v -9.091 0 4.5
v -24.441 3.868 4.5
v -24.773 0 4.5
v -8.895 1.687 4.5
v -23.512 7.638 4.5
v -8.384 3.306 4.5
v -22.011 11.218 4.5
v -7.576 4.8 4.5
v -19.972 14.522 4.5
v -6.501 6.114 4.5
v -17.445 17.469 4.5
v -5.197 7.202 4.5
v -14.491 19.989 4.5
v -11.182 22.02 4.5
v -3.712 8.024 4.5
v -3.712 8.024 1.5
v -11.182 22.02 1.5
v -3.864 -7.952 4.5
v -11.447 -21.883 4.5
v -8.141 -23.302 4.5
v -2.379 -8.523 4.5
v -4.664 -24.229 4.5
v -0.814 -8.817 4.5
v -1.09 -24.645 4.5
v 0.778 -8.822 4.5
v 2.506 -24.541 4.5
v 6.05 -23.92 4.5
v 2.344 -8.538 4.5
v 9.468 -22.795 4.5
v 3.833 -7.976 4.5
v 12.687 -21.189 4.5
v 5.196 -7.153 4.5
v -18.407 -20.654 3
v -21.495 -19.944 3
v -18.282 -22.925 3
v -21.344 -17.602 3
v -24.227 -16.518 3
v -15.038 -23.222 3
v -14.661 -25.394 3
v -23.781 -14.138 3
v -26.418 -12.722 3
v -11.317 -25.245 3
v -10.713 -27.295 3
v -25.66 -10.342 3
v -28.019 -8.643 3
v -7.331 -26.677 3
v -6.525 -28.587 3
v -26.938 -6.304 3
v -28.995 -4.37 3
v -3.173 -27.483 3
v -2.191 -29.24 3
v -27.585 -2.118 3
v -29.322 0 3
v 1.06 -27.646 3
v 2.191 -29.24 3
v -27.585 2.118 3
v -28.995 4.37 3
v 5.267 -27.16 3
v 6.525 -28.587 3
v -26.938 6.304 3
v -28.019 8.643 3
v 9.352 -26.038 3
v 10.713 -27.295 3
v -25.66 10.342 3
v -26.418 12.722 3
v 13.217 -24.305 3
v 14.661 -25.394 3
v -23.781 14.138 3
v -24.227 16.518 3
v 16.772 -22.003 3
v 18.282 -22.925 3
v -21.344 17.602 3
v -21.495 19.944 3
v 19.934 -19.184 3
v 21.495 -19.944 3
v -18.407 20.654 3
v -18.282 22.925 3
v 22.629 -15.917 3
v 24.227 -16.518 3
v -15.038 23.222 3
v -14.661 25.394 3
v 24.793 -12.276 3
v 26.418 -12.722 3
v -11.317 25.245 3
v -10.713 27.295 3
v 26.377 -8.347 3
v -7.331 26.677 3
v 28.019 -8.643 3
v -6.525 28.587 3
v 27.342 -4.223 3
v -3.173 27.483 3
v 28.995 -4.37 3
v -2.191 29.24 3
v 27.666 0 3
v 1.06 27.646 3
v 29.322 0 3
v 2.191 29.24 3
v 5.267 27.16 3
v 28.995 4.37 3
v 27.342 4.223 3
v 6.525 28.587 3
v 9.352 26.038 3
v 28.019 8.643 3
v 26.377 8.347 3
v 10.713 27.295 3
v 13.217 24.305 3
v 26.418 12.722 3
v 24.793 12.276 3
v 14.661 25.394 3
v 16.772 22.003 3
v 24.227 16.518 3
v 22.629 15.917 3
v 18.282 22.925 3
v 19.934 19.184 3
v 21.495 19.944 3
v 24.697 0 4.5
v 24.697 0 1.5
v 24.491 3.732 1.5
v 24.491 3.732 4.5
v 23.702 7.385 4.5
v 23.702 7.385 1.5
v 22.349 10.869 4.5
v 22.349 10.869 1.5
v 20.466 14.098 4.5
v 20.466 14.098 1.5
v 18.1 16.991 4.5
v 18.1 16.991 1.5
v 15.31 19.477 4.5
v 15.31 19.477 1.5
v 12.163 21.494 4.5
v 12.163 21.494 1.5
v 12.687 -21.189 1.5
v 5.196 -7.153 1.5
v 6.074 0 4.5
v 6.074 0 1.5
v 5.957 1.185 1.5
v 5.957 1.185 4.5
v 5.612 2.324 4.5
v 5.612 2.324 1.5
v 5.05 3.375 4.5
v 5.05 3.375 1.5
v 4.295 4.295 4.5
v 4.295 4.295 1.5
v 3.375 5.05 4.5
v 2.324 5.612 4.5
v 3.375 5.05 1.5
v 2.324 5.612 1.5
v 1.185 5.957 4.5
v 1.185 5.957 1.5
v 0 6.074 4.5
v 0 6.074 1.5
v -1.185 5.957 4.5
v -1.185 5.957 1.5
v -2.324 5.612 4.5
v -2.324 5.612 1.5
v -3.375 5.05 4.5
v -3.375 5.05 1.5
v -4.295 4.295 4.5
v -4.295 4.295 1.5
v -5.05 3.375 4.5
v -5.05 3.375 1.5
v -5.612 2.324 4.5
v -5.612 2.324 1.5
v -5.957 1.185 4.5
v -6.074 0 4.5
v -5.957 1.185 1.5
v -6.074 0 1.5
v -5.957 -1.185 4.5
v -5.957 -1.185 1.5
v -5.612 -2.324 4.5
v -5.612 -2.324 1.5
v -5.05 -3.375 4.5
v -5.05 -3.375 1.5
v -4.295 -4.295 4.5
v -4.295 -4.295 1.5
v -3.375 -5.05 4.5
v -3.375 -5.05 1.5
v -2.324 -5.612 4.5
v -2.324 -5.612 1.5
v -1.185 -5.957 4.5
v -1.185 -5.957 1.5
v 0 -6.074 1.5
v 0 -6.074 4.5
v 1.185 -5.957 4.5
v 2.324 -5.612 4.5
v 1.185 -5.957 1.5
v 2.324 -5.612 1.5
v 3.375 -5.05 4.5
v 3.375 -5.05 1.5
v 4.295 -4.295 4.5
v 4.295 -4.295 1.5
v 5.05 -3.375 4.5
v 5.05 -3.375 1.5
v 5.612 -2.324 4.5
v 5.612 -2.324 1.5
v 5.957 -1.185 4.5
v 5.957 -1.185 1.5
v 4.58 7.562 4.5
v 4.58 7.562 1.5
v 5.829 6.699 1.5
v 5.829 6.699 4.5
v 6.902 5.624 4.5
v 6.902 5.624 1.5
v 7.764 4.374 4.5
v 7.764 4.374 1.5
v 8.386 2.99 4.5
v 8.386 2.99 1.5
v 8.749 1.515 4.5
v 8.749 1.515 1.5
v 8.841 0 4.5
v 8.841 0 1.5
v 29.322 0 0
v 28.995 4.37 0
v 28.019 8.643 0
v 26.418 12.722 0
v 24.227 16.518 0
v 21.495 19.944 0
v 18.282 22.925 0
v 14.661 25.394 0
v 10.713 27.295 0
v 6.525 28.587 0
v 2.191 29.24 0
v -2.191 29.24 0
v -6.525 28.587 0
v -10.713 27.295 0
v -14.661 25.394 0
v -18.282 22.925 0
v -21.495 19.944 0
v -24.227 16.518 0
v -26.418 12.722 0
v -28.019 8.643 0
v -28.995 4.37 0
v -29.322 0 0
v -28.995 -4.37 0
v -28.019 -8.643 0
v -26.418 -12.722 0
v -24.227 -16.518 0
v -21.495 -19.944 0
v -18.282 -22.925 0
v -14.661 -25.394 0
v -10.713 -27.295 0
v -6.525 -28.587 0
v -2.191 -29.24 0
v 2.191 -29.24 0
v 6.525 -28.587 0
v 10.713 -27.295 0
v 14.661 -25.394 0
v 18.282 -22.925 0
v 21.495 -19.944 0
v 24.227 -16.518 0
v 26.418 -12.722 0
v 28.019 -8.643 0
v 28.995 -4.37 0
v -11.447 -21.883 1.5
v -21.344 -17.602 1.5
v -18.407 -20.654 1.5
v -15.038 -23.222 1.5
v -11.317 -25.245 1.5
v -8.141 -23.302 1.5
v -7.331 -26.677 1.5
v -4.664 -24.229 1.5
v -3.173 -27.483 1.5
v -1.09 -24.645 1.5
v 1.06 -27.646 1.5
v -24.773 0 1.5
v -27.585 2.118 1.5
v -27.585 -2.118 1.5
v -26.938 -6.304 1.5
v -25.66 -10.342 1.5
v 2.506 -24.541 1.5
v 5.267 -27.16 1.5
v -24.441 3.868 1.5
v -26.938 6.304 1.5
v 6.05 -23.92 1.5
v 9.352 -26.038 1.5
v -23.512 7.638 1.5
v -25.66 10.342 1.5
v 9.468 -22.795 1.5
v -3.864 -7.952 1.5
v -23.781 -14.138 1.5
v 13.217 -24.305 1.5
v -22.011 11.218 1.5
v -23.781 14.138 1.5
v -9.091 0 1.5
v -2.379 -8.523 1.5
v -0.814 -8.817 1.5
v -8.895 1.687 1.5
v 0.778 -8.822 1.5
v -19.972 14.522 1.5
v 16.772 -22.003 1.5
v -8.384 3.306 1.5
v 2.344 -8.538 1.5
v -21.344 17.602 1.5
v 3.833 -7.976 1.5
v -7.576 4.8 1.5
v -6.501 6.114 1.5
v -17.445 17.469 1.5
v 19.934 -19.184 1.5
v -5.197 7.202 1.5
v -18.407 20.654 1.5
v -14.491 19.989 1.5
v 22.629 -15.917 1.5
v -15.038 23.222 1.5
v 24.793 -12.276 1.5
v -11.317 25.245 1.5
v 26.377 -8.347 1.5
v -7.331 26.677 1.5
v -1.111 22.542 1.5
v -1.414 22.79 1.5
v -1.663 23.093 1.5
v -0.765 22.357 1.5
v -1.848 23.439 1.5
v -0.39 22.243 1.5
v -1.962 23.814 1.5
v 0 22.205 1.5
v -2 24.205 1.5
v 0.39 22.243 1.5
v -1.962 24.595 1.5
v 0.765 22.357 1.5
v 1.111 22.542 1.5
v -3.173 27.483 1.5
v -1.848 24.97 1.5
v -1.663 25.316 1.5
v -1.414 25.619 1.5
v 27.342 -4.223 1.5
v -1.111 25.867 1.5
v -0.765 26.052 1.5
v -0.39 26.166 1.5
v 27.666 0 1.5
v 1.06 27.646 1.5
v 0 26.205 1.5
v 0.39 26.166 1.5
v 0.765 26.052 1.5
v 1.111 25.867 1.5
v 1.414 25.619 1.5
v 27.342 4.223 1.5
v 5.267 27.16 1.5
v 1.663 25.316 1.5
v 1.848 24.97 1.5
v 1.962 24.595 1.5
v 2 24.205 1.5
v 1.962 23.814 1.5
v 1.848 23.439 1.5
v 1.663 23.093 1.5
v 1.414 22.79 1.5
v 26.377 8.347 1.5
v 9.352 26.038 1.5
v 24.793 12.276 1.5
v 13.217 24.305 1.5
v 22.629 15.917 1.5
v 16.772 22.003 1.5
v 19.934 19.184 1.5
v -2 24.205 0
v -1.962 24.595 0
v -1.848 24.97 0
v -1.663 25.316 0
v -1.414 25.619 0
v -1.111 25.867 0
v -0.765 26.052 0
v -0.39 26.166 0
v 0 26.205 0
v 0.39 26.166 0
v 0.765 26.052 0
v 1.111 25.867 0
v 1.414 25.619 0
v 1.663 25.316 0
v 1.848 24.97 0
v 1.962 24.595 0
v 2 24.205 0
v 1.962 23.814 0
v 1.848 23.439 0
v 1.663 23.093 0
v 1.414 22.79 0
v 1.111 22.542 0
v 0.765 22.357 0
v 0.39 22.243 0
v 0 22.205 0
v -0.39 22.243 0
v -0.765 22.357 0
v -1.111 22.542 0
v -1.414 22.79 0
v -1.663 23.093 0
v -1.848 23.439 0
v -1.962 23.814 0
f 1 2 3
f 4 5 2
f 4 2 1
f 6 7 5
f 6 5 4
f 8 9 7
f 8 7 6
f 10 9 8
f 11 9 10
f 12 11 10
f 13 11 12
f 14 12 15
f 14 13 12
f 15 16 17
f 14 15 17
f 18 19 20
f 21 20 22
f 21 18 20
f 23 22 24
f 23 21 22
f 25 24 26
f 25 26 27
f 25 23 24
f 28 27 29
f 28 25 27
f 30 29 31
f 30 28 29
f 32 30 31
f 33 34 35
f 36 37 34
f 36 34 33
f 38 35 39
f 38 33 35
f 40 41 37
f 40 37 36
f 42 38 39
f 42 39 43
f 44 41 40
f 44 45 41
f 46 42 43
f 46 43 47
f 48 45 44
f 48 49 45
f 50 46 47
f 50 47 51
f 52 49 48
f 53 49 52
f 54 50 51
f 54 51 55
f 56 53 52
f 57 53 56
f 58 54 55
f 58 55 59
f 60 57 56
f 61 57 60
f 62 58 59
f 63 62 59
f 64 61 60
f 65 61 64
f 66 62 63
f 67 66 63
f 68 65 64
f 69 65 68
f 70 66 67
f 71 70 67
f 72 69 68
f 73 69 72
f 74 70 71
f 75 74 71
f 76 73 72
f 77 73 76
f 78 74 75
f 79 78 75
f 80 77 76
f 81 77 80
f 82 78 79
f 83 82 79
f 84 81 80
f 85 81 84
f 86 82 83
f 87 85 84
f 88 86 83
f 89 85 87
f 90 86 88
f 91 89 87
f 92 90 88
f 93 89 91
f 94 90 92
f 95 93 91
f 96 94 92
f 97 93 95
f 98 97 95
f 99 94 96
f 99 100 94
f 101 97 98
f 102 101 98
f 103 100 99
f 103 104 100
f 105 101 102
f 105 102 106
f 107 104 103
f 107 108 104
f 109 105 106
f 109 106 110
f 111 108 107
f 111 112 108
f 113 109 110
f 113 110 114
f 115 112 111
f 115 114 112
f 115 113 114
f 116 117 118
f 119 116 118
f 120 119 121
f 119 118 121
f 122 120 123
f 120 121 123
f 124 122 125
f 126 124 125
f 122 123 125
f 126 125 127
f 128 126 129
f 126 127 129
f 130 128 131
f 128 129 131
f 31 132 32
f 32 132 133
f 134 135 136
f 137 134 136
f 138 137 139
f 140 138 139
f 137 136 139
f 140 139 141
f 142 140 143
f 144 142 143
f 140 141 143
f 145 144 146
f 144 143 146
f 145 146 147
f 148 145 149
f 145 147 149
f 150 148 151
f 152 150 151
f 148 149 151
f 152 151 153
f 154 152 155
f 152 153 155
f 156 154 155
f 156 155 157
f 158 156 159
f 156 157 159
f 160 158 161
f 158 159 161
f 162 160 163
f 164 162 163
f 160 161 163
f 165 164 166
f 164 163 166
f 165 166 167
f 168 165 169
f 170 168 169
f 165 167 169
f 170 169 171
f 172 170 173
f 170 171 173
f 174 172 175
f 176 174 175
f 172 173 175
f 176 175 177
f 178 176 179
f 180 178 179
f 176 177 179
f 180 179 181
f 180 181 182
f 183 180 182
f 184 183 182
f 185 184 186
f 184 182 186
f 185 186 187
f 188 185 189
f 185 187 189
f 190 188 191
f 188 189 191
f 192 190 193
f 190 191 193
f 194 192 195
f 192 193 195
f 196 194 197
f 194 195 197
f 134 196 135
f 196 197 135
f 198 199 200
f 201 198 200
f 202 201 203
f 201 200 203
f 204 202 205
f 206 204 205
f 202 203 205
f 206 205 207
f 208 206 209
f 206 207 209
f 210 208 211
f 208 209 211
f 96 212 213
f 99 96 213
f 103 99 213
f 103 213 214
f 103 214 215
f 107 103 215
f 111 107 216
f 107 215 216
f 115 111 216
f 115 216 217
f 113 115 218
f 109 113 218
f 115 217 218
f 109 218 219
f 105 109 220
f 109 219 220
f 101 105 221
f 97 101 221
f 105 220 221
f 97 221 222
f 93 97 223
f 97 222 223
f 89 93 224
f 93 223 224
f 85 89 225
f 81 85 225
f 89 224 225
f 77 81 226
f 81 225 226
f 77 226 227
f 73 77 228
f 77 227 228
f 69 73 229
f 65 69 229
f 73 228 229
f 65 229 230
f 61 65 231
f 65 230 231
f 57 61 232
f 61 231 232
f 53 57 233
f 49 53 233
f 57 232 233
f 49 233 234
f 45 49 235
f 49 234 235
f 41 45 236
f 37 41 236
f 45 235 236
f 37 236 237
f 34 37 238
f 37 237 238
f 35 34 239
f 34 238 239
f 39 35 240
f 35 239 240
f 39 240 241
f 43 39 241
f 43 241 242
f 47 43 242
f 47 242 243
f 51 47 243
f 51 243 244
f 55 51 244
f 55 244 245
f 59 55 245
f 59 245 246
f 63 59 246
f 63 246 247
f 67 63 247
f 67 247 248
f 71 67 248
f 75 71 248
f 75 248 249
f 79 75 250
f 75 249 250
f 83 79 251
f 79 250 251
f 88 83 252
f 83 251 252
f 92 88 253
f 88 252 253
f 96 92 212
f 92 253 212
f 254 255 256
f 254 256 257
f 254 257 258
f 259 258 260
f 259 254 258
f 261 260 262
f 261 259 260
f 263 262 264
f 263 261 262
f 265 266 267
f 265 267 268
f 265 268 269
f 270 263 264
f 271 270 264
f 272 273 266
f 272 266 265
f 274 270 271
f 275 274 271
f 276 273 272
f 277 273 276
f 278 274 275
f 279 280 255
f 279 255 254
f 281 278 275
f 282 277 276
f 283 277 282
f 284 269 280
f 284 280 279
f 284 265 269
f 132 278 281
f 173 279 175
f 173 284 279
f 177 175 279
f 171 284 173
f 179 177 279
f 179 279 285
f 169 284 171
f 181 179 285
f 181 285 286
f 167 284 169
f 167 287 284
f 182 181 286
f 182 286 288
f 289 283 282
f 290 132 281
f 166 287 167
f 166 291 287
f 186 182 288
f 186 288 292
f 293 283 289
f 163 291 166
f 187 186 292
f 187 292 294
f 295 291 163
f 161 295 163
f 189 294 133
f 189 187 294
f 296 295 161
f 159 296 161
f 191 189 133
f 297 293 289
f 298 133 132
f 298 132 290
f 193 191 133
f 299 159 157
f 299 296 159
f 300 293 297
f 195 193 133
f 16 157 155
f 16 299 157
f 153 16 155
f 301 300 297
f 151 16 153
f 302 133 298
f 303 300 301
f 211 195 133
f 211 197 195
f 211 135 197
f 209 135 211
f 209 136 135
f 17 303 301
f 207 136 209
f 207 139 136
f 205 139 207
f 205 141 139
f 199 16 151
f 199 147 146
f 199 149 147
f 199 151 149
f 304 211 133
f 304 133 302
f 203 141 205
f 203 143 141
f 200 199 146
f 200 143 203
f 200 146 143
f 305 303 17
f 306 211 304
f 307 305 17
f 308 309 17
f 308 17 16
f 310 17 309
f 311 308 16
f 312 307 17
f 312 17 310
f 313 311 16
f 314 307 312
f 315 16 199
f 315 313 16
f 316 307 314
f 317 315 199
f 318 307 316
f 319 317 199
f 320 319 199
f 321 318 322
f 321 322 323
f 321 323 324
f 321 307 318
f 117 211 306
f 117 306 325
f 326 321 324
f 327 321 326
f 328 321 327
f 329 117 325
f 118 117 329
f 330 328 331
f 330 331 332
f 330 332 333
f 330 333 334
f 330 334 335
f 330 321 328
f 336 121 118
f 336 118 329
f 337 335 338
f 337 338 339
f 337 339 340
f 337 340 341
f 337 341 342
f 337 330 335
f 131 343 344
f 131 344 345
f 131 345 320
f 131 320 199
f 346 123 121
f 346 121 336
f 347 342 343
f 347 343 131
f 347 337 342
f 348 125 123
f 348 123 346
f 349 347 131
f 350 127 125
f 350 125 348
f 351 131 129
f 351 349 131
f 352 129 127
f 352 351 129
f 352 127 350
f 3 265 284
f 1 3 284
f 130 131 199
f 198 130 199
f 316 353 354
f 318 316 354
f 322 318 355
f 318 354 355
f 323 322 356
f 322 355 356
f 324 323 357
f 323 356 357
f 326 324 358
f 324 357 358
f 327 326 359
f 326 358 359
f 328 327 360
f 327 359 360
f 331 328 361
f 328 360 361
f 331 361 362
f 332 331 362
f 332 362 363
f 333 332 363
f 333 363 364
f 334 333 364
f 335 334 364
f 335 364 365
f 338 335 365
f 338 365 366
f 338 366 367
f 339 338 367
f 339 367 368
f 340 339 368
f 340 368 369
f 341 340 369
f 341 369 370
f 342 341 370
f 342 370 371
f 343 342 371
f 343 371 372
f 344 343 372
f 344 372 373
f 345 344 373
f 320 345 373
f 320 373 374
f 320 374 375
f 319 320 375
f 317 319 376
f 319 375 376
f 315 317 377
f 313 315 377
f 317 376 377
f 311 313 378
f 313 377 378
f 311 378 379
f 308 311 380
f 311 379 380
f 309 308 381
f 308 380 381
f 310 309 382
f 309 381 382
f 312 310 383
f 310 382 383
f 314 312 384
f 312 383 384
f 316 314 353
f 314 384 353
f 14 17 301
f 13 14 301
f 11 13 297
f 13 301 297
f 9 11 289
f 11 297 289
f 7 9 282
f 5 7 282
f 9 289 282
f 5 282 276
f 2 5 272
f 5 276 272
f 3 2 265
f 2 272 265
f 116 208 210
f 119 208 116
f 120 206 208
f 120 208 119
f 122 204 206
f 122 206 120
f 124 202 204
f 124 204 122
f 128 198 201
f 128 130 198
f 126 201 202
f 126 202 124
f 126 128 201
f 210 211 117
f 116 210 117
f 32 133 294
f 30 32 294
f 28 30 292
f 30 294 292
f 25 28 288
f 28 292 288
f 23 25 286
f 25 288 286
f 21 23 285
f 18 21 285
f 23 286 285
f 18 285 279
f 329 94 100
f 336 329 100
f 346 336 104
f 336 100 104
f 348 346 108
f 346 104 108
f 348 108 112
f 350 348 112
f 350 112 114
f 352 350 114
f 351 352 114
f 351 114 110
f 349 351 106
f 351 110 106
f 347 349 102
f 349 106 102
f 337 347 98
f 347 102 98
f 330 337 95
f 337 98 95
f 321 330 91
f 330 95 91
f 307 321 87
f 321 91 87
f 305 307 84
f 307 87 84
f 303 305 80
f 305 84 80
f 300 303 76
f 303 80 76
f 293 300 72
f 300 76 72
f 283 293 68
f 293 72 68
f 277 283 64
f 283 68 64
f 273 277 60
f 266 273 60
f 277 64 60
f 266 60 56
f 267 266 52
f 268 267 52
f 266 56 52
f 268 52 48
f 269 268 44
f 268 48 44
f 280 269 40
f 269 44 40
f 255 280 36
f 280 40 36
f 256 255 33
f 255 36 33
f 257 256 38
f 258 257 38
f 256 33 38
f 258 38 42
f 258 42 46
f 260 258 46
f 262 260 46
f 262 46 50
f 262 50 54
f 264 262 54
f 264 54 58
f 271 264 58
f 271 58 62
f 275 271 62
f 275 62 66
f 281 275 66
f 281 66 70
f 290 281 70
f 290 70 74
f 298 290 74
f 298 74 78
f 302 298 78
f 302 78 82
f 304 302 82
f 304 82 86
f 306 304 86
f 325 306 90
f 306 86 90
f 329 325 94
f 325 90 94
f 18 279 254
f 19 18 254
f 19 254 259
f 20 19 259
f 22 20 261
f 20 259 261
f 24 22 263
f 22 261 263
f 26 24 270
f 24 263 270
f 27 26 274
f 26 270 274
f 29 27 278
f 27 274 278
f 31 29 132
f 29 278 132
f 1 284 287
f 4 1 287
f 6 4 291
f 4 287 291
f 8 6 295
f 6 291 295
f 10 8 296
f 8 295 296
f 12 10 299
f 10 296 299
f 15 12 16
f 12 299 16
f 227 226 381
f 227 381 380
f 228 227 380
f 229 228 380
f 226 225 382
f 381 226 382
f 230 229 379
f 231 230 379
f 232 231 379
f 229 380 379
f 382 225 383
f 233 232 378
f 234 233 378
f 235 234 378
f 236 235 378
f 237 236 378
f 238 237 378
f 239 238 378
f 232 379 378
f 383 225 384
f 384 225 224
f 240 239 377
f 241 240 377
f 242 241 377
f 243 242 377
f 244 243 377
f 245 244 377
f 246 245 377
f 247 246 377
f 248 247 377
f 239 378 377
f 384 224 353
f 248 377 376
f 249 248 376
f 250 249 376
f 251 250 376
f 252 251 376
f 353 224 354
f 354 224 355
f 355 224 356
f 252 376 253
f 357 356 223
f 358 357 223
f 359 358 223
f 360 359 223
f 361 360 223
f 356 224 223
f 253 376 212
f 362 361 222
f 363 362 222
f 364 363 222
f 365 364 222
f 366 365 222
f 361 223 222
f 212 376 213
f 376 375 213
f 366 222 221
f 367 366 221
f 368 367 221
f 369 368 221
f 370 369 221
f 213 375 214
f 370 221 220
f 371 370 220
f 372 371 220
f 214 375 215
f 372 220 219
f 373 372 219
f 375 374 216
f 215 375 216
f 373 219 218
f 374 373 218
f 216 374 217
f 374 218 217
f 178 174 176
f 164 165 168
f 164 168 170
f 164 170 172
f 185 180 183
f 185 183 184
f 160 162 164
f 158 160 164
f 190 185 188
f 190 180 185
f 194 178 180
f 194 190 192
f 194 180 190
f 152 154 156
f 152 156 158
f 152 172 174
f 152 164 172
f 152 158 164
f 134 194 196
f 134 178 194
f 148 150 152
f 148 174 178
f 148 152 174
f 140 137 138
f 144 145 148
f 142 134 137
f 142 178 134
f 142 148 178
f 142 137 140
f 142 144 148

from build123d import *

# Parameters (mm, degrees)
F0_R     = 29.322045
F1_DEPTH = 3
F2_R     = 27.665962
F3_DEPTH = 1.5
F4_R     = 6.073968
F5_DEPTH = 3
F7_D     = 4
F7_DEPTH = 2


with BuildPart() as f1:
    # F0 (on Top) → F1 (new body)
    with BuildSketch(Plane.XY):
        Circle(F0_R)
    extrude(amount=F1_DEPTH)

    # F2 (on face) → F3 (cut)
    with BuildSketch(Plane.XY.offset(3)):
        Circle(F2_R)
    extrude(amount=-F3_DEPTH, mode=Mode.SUBTRACT)

    # F4 (on face) → F5 (join)
    with BuildSketch(Plane.XY.offset(1.5)):
        Circle(F4_R)
        with BuildLine():
            ThreePointArc((-11.182132, 22.020222), (-21.055439, 12.909818), (-24.772728, 0))
            Line((-24.772728, 0), (-9.090909, 0))
            ThreePointArc((-9.090909, 0), (-7.576474, 4.79996), (-3.711611, 8.024237))
            Line((-3.711611, 8.024237), (-11.182132, 22.020222))
        make_face()
        with BuildLine():
            ThreePointArc((4.580156, 7.562137), (7.763511, 4.374334), (8.841026, 0))
            Line((8.841026, 0), (24.696766, 0))
            ThreePointArc((24.696766, 0), (21.471368, 12.52034), (12.163349, 21.493795))
            Line((12.163349, 21.493795), (4.580156, 7.562137))
        make_face()
        with BuildLine():
            ThreePointArc((-11.447483, -21.88345), (0.709798, -24.657945), (12.687344, -21.188694))
            Line((12.687344, -21.188694), (5.195707, -7.153148))
            ThreePointArc((5.195707, -7.153148), (0.777582, -8.821586), (-3.86429, -7.951793))
            Line((-3.86429, -7.951793), (-11.447483, -21.88345))
        make_face()
    extrude(amount=F5_DEPTH)

    # F7
    with Locations(Plane.XY.offset(1.5)):
        with Locations((0, 24.204547)):
            Hole(F7_D / 2, depth=F7_DEPTH)


solid = f1.part
